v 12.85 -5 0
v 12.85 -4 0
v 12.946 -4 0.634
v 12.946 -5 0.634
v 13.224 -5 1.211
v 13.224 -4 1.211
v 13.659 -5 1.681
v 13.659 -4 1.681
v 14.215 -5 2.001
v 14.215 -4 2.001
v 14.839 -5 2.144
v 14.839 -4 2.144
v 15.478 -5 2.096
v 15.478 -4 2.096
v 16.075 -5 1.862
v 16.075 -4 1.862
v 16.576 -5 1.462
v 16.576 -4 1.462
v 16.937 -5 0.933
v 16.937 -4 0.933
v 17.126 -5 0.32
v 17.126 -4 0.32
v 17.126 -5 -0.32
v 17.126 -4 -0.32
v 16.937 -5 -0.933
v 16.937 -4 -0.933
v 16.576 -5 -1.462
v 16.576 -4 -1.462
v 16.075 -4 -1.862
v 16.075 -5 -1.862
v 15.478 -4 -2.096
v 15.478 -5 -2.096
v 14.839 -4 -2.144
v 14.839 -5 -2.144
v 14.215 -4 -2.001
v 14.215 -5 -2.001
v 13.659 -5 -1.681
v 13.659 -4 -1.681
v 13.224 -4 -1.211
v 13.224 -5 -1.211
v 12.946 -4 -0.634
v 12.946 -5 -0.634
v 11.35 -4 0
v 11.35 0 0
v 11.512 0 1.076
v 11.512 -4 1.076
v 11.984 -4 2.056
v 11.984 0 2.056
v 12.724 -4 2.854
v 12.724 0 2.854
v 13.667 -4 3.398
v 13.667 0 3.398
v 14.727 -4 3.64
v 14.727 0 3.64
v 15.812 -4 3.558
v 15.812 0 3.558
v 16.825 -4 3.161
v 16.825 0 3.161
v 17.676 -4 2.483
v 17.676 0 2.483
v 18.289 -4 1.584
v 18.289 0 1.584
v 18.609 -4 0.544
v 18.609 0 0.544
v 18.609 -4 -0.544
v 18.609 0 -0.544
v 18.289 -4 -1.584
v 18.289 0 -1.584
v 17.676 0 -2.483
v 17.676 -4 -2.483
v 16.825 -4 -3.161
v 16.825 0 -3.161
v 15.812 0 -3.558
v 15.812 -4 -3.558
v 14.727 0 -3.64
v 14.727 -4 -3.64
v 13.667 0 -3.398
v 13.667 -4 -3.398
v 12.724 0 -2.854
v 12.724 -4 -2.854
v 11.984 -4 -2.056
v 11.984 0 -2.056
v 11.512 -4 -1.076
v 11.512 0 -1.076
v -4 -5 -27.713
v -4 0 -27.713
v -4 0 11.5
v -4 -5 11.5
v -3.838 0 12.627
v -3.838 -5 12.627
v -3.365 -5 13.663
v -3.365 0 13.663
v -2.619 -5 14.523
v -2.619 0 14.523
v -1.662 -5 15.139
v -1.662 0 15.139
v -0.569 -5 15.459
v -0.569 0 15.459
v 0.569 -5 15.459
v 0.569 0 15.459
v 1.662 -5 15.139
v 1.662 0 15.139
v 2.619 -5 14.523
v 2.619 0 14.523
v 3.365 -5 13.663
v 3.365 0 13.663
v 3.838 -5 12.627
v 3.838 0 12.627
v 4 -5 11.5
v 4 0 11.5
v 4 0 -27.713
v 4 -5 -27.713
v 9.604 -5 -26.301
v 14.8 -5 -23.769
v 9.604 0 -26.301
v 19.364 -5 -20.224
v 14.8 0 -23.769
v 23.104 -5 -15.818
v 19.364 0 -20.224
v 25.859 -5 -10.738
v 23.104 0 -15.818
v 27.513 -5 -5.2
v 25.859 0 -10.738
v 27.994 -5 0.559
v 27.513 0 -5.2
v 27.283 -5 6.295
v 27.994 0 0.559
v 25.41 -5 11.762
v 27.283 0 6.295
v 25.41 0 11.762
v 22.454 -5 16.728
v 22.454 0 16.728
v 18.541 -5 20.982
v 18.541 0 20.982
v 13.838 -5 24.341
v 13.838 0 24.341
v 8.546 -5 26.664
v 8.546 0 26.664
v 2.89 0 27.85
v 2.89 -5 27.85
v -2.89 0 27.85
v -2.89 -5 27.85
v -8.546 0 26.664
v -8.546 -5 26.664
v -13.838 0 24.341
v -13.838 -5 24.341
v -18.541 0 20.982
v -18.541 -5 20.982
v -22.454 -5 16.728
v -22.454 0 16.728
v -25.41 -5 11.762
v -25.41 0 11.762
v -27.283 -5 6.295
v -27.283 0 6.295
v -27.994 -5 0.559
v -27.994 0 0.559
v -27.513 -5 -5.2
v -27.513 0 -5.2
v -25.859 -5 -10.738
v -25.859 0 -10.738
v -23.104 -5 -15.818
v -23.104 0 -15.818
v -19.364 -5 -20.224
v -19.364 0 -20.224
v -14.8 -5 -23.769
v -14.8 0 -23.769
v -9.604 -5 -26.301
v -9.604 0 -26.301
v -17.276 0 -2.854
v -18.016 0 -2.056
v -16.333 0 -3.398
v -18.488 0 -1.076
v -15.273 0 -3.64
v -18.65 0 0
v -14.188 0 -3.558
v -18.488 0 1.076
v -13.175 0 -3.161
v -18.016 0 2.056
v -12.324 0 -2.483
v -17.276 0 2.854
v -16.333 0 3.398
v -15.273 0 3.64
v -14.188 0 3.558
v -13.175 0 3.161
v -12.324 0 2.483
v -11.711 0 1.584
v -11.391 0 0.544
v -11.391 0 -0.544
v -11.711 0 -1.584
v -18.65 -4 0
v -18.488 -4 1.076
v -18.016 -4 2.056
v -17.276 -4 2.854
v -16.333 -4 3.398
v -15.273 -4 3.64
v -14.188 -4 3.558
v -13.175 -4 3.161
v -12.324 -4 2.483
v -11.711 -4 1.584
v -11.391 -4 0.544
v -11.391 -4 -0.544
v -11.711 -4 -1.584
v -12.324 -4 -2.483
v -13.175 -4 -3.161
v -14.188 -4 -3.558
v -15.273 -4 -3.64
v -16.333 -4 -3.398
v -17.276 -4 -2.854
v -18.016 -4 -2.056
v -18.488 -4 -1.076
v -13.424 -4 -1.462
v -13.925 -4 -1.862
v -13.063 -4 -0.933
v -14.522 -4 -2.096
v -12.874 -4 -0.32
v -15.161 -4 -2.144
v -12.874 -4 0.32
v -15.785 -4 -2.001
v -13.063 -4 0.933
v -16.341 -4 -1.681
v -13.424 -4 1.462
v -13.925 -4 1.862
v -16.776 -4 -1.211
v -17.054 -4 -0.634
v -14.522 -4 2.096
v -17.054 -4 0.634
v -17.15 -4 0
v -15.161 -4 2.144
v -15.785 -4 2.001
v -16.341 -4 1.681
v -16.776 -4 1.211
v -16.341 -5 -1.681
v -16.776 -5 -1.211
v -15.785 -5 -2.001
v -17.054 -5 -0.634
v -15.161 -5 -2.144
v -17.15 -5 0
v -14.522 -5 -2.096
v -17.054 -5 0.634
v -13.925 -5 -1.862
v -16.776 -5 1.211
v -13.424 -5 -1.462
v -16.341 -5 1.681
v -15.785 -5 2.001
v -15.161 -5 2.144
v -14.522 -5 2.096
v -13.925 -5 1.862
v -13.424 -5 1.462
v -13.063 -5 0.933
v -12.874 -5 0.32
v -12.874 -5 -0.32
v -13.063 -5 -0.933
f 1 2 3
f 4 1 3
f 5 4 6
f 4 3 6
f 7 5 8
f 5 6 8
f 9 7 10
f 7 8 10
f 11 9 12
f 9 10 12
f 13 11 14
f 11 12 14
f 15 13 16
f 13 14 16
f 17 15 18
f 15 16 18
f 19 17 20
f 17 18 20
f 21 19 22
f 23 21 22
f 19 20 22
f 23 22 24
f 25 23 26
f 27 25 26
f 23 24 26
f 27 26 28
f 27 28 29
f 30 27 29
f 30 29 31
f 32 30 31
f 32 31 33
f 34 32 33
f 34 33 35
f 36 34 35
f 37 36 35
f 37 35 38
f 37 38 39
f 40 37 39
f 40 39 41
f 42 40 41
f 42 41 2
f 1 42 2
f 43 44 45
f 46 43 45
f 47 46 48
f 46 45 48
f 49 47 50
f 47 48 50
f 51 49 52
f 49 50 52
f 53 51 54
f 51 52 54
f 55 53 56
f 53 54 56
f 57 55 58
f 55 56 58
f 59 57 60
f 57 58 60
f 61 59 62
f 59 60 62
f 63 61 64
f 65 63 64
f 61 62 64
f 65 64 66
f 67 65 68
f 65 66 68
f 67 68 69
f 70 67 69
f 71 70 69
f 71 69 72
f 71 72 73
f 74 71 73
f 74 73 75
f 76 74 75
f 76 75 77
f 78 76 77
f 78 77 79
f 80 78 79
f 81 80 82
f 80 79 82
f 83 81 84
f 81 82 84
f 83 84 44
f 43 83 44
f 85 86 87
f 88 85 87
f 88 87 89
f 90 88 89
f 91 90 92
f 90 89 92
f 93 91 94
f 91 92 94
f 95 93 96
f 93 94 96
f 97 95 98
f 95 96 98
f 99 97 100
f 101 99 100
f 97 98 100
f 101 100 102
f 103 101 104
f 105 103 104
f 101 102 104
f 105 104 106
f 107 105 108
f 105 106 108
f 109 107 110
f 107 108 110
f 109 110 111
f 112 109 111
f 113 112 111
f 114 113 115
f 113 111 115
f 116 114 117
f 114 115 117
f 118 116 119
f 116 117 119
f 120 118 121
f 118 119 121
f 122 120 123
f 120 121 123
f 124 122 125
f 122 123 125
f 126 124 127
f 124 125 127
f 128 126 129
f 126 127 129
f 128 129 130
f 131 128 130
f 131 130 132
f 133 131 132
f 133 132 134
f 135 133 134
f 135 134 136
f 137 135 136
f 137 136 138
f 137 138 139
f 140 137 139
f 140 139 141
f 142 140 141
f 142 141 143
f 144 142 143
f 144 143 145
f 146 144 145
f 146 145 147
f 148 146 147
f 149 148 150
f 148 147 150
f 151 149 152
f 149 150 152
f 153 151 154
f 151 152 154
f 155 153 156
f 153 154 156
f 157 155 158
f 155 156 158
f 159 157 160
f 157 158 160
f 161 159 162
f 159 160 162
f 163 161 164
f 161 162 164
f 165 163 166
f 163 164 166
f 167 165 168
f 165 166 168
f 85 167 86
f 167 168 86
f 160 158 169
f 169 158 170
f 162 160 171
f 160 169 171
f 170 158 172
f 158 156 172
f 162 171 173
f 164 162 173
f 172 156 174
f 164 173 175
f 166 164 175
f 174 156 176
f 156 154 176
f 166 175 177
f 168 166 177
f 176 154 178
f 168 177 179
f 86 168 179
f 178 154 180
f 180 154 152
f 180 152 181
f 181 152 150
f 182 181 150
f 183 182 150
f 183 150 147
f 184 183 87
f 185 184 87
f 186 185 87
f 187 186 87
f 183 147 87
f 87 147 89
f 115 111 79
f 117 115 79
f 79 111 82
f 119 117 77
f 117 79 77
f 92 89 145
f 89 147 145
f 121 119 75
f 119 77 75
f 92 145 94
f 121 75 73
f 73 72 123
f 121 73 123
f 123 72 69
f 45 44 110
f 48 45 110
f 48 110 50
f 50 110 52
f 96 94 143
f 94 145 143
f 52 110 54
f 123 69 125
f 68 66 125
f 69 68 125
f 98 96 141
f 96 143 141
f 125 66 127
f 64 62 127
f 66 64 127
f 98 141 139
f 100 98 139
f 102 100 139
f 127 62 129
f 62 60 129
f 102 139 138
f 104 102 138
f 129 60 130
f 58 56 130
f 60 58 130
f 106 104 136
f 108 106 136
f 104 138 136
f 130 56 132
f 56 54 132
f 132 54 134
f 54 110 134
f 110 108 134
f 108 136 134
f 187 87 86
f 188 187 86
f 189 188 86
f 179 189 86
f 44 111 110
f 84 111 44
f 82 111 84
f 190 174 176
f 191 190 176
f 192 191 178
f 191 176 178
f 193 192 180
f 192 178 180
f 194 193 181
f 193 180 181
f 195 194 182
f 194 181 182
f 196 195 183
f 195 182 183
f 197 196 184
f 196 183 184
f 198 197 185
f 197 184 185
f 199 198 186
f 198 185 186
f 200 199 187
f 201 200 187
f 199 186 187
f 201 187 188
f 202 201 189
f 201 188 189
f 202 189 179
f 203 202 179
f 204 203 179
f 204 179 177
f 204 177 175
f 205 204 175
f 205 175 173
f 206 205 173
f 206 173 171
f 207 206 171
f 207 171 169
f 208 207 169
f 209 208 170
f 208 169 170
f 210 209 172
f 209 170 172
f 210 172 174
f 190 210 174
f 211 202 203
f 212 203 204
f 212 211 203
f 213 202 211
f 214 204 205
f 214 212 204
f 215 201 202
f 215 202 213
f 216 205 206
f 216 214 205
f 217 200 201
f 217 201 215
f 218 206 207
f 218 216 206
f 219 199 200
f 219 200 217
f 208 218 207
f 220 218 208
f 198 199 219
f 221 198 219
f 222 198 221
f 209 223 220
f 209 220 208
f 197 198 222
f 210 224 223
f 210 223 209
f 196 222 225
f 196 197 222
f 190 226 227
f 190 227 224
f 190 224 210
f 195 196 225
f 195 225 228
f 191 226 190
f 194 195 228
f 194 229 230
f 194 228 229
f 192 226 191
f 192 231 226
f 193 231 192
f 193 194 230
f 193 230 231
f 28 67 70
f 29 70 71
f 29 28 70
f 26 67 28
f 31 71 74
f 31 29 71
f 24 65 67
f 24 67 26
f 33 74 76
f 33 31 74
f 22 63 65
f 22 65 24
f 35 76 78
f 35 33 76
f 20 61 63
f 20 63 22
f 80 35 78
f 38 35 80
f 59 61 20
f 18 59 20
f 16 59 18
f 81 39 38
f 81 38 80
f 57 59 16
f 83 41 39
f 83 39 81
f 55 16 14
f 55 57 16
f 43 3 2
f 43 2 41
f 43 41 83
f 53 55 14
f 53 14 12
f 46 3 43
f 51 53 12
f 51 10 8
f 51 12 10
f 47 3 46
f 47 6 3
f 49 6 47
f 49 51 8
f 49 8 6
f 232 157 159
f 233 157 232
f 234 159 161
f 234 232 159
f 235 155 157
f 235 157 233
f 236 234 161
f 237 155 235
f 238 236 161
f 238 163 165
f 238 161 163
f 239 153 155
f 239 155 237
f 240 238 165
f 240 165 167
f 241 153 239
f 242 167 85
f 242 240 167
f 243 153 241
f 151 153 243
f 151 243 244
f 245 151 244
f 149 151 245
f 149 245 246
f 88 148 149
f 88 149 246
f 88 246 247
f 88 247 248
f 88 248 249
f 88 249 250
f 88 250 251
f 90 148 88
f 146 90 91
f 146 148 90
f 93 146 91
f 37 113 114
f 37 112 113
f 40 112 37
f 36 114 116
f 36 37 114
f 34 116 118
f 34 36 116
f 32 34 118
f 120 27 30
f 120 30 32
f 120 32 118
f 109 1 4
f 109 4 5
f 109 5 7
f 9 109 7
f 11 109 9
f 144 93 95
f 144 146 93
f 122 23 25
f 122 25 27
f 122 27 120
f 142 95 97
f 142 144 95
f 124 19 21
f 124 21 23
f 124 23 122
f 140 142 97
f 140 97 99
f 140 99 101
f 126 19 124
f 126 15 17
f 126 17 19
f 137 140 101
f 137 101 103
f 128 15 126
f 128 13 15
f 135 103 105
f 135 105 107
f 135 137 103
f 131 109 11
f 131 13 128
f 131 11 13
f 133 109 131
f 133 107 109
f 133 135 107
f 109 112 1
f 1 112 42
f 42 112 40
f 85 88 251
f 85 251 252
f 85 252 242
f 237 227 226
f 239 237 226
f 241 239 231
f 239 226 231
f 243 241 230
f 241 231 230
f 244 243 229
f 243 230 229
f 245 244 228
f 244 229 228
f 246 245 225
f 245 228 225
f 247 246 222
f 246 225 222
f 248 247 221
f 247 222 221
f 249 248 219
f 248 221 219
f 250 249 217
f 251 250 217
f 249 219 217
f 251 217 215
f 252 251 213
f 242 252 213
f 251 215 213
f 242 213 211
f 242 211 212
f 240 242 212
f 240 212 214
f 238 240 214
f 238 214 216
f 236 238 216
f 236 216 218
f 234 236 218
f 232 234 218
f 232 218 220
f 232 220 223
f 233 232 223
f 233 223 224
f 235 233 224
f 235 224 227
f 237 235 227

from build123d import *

# Parameters (mm, degrees)
F0_R     = 28
F1_DEPTH = 5
F3_DEPTH = 35
F4_R     = 2.15
F5_DEPTH = 25
F6_R     = 3.65
F7_DEPTH = 4


with BuildPart() as f1:
    # F0 (on Front) → F1 (new body)
    with BuildSketch(Plane.XZ):
        Circle(F0_R)
    extrude(amount=F1_DEPTH)

    # F2 (on face) → F3 (cut)
    with BuildSketch(Plane(origin=(0, 0, 0), x_dir=(-1, 0, 0), z_dir=(0, 1, 0))):
        with BuildLine():
            ThreePointArc((4, 11.5), (0, 15.5), (-4, 11.5))
            Line((-4, 11.5), (-4, -27.712813))
            ThreePointArc((-4, -27.712813), (0, -28), (4, -27.712813))
            Line((4, -27.712813), (4, 11.5))
        make_face()
    extrude(amount=-F3_DEPTH, mode=Mode.SUBTRACT)

    # F4 (on face) → F5 (cut)
    with BuildSketch(Plane(origin=(0, 0, 0), x_dir=(-1, 0, 0), z_dir=(0, 1, 0))):
        with Locations((-15, 0)):
            Circle(F4_R)
        with Locations((15, 0)):
            Circle(F4_R)
    extrude(amount=-F5_DEPTH, mode=Mode.SUBTRACT)

    # F6 (on face) → F7 (cut)
    with BuildSketch(Plane(origin=(0, 0, 0), x_dir=(-1, 0, 0), z_dir=(0, 1, 0))):
        with Locations((-15, 0)):
            Circle(F6_R)
        with Locations((15, 0)):
            Circle(F6_R)
    extrude(amount=-F7_DEPTH, mode=Mode.SUBTRACT)


solid = f1.part
